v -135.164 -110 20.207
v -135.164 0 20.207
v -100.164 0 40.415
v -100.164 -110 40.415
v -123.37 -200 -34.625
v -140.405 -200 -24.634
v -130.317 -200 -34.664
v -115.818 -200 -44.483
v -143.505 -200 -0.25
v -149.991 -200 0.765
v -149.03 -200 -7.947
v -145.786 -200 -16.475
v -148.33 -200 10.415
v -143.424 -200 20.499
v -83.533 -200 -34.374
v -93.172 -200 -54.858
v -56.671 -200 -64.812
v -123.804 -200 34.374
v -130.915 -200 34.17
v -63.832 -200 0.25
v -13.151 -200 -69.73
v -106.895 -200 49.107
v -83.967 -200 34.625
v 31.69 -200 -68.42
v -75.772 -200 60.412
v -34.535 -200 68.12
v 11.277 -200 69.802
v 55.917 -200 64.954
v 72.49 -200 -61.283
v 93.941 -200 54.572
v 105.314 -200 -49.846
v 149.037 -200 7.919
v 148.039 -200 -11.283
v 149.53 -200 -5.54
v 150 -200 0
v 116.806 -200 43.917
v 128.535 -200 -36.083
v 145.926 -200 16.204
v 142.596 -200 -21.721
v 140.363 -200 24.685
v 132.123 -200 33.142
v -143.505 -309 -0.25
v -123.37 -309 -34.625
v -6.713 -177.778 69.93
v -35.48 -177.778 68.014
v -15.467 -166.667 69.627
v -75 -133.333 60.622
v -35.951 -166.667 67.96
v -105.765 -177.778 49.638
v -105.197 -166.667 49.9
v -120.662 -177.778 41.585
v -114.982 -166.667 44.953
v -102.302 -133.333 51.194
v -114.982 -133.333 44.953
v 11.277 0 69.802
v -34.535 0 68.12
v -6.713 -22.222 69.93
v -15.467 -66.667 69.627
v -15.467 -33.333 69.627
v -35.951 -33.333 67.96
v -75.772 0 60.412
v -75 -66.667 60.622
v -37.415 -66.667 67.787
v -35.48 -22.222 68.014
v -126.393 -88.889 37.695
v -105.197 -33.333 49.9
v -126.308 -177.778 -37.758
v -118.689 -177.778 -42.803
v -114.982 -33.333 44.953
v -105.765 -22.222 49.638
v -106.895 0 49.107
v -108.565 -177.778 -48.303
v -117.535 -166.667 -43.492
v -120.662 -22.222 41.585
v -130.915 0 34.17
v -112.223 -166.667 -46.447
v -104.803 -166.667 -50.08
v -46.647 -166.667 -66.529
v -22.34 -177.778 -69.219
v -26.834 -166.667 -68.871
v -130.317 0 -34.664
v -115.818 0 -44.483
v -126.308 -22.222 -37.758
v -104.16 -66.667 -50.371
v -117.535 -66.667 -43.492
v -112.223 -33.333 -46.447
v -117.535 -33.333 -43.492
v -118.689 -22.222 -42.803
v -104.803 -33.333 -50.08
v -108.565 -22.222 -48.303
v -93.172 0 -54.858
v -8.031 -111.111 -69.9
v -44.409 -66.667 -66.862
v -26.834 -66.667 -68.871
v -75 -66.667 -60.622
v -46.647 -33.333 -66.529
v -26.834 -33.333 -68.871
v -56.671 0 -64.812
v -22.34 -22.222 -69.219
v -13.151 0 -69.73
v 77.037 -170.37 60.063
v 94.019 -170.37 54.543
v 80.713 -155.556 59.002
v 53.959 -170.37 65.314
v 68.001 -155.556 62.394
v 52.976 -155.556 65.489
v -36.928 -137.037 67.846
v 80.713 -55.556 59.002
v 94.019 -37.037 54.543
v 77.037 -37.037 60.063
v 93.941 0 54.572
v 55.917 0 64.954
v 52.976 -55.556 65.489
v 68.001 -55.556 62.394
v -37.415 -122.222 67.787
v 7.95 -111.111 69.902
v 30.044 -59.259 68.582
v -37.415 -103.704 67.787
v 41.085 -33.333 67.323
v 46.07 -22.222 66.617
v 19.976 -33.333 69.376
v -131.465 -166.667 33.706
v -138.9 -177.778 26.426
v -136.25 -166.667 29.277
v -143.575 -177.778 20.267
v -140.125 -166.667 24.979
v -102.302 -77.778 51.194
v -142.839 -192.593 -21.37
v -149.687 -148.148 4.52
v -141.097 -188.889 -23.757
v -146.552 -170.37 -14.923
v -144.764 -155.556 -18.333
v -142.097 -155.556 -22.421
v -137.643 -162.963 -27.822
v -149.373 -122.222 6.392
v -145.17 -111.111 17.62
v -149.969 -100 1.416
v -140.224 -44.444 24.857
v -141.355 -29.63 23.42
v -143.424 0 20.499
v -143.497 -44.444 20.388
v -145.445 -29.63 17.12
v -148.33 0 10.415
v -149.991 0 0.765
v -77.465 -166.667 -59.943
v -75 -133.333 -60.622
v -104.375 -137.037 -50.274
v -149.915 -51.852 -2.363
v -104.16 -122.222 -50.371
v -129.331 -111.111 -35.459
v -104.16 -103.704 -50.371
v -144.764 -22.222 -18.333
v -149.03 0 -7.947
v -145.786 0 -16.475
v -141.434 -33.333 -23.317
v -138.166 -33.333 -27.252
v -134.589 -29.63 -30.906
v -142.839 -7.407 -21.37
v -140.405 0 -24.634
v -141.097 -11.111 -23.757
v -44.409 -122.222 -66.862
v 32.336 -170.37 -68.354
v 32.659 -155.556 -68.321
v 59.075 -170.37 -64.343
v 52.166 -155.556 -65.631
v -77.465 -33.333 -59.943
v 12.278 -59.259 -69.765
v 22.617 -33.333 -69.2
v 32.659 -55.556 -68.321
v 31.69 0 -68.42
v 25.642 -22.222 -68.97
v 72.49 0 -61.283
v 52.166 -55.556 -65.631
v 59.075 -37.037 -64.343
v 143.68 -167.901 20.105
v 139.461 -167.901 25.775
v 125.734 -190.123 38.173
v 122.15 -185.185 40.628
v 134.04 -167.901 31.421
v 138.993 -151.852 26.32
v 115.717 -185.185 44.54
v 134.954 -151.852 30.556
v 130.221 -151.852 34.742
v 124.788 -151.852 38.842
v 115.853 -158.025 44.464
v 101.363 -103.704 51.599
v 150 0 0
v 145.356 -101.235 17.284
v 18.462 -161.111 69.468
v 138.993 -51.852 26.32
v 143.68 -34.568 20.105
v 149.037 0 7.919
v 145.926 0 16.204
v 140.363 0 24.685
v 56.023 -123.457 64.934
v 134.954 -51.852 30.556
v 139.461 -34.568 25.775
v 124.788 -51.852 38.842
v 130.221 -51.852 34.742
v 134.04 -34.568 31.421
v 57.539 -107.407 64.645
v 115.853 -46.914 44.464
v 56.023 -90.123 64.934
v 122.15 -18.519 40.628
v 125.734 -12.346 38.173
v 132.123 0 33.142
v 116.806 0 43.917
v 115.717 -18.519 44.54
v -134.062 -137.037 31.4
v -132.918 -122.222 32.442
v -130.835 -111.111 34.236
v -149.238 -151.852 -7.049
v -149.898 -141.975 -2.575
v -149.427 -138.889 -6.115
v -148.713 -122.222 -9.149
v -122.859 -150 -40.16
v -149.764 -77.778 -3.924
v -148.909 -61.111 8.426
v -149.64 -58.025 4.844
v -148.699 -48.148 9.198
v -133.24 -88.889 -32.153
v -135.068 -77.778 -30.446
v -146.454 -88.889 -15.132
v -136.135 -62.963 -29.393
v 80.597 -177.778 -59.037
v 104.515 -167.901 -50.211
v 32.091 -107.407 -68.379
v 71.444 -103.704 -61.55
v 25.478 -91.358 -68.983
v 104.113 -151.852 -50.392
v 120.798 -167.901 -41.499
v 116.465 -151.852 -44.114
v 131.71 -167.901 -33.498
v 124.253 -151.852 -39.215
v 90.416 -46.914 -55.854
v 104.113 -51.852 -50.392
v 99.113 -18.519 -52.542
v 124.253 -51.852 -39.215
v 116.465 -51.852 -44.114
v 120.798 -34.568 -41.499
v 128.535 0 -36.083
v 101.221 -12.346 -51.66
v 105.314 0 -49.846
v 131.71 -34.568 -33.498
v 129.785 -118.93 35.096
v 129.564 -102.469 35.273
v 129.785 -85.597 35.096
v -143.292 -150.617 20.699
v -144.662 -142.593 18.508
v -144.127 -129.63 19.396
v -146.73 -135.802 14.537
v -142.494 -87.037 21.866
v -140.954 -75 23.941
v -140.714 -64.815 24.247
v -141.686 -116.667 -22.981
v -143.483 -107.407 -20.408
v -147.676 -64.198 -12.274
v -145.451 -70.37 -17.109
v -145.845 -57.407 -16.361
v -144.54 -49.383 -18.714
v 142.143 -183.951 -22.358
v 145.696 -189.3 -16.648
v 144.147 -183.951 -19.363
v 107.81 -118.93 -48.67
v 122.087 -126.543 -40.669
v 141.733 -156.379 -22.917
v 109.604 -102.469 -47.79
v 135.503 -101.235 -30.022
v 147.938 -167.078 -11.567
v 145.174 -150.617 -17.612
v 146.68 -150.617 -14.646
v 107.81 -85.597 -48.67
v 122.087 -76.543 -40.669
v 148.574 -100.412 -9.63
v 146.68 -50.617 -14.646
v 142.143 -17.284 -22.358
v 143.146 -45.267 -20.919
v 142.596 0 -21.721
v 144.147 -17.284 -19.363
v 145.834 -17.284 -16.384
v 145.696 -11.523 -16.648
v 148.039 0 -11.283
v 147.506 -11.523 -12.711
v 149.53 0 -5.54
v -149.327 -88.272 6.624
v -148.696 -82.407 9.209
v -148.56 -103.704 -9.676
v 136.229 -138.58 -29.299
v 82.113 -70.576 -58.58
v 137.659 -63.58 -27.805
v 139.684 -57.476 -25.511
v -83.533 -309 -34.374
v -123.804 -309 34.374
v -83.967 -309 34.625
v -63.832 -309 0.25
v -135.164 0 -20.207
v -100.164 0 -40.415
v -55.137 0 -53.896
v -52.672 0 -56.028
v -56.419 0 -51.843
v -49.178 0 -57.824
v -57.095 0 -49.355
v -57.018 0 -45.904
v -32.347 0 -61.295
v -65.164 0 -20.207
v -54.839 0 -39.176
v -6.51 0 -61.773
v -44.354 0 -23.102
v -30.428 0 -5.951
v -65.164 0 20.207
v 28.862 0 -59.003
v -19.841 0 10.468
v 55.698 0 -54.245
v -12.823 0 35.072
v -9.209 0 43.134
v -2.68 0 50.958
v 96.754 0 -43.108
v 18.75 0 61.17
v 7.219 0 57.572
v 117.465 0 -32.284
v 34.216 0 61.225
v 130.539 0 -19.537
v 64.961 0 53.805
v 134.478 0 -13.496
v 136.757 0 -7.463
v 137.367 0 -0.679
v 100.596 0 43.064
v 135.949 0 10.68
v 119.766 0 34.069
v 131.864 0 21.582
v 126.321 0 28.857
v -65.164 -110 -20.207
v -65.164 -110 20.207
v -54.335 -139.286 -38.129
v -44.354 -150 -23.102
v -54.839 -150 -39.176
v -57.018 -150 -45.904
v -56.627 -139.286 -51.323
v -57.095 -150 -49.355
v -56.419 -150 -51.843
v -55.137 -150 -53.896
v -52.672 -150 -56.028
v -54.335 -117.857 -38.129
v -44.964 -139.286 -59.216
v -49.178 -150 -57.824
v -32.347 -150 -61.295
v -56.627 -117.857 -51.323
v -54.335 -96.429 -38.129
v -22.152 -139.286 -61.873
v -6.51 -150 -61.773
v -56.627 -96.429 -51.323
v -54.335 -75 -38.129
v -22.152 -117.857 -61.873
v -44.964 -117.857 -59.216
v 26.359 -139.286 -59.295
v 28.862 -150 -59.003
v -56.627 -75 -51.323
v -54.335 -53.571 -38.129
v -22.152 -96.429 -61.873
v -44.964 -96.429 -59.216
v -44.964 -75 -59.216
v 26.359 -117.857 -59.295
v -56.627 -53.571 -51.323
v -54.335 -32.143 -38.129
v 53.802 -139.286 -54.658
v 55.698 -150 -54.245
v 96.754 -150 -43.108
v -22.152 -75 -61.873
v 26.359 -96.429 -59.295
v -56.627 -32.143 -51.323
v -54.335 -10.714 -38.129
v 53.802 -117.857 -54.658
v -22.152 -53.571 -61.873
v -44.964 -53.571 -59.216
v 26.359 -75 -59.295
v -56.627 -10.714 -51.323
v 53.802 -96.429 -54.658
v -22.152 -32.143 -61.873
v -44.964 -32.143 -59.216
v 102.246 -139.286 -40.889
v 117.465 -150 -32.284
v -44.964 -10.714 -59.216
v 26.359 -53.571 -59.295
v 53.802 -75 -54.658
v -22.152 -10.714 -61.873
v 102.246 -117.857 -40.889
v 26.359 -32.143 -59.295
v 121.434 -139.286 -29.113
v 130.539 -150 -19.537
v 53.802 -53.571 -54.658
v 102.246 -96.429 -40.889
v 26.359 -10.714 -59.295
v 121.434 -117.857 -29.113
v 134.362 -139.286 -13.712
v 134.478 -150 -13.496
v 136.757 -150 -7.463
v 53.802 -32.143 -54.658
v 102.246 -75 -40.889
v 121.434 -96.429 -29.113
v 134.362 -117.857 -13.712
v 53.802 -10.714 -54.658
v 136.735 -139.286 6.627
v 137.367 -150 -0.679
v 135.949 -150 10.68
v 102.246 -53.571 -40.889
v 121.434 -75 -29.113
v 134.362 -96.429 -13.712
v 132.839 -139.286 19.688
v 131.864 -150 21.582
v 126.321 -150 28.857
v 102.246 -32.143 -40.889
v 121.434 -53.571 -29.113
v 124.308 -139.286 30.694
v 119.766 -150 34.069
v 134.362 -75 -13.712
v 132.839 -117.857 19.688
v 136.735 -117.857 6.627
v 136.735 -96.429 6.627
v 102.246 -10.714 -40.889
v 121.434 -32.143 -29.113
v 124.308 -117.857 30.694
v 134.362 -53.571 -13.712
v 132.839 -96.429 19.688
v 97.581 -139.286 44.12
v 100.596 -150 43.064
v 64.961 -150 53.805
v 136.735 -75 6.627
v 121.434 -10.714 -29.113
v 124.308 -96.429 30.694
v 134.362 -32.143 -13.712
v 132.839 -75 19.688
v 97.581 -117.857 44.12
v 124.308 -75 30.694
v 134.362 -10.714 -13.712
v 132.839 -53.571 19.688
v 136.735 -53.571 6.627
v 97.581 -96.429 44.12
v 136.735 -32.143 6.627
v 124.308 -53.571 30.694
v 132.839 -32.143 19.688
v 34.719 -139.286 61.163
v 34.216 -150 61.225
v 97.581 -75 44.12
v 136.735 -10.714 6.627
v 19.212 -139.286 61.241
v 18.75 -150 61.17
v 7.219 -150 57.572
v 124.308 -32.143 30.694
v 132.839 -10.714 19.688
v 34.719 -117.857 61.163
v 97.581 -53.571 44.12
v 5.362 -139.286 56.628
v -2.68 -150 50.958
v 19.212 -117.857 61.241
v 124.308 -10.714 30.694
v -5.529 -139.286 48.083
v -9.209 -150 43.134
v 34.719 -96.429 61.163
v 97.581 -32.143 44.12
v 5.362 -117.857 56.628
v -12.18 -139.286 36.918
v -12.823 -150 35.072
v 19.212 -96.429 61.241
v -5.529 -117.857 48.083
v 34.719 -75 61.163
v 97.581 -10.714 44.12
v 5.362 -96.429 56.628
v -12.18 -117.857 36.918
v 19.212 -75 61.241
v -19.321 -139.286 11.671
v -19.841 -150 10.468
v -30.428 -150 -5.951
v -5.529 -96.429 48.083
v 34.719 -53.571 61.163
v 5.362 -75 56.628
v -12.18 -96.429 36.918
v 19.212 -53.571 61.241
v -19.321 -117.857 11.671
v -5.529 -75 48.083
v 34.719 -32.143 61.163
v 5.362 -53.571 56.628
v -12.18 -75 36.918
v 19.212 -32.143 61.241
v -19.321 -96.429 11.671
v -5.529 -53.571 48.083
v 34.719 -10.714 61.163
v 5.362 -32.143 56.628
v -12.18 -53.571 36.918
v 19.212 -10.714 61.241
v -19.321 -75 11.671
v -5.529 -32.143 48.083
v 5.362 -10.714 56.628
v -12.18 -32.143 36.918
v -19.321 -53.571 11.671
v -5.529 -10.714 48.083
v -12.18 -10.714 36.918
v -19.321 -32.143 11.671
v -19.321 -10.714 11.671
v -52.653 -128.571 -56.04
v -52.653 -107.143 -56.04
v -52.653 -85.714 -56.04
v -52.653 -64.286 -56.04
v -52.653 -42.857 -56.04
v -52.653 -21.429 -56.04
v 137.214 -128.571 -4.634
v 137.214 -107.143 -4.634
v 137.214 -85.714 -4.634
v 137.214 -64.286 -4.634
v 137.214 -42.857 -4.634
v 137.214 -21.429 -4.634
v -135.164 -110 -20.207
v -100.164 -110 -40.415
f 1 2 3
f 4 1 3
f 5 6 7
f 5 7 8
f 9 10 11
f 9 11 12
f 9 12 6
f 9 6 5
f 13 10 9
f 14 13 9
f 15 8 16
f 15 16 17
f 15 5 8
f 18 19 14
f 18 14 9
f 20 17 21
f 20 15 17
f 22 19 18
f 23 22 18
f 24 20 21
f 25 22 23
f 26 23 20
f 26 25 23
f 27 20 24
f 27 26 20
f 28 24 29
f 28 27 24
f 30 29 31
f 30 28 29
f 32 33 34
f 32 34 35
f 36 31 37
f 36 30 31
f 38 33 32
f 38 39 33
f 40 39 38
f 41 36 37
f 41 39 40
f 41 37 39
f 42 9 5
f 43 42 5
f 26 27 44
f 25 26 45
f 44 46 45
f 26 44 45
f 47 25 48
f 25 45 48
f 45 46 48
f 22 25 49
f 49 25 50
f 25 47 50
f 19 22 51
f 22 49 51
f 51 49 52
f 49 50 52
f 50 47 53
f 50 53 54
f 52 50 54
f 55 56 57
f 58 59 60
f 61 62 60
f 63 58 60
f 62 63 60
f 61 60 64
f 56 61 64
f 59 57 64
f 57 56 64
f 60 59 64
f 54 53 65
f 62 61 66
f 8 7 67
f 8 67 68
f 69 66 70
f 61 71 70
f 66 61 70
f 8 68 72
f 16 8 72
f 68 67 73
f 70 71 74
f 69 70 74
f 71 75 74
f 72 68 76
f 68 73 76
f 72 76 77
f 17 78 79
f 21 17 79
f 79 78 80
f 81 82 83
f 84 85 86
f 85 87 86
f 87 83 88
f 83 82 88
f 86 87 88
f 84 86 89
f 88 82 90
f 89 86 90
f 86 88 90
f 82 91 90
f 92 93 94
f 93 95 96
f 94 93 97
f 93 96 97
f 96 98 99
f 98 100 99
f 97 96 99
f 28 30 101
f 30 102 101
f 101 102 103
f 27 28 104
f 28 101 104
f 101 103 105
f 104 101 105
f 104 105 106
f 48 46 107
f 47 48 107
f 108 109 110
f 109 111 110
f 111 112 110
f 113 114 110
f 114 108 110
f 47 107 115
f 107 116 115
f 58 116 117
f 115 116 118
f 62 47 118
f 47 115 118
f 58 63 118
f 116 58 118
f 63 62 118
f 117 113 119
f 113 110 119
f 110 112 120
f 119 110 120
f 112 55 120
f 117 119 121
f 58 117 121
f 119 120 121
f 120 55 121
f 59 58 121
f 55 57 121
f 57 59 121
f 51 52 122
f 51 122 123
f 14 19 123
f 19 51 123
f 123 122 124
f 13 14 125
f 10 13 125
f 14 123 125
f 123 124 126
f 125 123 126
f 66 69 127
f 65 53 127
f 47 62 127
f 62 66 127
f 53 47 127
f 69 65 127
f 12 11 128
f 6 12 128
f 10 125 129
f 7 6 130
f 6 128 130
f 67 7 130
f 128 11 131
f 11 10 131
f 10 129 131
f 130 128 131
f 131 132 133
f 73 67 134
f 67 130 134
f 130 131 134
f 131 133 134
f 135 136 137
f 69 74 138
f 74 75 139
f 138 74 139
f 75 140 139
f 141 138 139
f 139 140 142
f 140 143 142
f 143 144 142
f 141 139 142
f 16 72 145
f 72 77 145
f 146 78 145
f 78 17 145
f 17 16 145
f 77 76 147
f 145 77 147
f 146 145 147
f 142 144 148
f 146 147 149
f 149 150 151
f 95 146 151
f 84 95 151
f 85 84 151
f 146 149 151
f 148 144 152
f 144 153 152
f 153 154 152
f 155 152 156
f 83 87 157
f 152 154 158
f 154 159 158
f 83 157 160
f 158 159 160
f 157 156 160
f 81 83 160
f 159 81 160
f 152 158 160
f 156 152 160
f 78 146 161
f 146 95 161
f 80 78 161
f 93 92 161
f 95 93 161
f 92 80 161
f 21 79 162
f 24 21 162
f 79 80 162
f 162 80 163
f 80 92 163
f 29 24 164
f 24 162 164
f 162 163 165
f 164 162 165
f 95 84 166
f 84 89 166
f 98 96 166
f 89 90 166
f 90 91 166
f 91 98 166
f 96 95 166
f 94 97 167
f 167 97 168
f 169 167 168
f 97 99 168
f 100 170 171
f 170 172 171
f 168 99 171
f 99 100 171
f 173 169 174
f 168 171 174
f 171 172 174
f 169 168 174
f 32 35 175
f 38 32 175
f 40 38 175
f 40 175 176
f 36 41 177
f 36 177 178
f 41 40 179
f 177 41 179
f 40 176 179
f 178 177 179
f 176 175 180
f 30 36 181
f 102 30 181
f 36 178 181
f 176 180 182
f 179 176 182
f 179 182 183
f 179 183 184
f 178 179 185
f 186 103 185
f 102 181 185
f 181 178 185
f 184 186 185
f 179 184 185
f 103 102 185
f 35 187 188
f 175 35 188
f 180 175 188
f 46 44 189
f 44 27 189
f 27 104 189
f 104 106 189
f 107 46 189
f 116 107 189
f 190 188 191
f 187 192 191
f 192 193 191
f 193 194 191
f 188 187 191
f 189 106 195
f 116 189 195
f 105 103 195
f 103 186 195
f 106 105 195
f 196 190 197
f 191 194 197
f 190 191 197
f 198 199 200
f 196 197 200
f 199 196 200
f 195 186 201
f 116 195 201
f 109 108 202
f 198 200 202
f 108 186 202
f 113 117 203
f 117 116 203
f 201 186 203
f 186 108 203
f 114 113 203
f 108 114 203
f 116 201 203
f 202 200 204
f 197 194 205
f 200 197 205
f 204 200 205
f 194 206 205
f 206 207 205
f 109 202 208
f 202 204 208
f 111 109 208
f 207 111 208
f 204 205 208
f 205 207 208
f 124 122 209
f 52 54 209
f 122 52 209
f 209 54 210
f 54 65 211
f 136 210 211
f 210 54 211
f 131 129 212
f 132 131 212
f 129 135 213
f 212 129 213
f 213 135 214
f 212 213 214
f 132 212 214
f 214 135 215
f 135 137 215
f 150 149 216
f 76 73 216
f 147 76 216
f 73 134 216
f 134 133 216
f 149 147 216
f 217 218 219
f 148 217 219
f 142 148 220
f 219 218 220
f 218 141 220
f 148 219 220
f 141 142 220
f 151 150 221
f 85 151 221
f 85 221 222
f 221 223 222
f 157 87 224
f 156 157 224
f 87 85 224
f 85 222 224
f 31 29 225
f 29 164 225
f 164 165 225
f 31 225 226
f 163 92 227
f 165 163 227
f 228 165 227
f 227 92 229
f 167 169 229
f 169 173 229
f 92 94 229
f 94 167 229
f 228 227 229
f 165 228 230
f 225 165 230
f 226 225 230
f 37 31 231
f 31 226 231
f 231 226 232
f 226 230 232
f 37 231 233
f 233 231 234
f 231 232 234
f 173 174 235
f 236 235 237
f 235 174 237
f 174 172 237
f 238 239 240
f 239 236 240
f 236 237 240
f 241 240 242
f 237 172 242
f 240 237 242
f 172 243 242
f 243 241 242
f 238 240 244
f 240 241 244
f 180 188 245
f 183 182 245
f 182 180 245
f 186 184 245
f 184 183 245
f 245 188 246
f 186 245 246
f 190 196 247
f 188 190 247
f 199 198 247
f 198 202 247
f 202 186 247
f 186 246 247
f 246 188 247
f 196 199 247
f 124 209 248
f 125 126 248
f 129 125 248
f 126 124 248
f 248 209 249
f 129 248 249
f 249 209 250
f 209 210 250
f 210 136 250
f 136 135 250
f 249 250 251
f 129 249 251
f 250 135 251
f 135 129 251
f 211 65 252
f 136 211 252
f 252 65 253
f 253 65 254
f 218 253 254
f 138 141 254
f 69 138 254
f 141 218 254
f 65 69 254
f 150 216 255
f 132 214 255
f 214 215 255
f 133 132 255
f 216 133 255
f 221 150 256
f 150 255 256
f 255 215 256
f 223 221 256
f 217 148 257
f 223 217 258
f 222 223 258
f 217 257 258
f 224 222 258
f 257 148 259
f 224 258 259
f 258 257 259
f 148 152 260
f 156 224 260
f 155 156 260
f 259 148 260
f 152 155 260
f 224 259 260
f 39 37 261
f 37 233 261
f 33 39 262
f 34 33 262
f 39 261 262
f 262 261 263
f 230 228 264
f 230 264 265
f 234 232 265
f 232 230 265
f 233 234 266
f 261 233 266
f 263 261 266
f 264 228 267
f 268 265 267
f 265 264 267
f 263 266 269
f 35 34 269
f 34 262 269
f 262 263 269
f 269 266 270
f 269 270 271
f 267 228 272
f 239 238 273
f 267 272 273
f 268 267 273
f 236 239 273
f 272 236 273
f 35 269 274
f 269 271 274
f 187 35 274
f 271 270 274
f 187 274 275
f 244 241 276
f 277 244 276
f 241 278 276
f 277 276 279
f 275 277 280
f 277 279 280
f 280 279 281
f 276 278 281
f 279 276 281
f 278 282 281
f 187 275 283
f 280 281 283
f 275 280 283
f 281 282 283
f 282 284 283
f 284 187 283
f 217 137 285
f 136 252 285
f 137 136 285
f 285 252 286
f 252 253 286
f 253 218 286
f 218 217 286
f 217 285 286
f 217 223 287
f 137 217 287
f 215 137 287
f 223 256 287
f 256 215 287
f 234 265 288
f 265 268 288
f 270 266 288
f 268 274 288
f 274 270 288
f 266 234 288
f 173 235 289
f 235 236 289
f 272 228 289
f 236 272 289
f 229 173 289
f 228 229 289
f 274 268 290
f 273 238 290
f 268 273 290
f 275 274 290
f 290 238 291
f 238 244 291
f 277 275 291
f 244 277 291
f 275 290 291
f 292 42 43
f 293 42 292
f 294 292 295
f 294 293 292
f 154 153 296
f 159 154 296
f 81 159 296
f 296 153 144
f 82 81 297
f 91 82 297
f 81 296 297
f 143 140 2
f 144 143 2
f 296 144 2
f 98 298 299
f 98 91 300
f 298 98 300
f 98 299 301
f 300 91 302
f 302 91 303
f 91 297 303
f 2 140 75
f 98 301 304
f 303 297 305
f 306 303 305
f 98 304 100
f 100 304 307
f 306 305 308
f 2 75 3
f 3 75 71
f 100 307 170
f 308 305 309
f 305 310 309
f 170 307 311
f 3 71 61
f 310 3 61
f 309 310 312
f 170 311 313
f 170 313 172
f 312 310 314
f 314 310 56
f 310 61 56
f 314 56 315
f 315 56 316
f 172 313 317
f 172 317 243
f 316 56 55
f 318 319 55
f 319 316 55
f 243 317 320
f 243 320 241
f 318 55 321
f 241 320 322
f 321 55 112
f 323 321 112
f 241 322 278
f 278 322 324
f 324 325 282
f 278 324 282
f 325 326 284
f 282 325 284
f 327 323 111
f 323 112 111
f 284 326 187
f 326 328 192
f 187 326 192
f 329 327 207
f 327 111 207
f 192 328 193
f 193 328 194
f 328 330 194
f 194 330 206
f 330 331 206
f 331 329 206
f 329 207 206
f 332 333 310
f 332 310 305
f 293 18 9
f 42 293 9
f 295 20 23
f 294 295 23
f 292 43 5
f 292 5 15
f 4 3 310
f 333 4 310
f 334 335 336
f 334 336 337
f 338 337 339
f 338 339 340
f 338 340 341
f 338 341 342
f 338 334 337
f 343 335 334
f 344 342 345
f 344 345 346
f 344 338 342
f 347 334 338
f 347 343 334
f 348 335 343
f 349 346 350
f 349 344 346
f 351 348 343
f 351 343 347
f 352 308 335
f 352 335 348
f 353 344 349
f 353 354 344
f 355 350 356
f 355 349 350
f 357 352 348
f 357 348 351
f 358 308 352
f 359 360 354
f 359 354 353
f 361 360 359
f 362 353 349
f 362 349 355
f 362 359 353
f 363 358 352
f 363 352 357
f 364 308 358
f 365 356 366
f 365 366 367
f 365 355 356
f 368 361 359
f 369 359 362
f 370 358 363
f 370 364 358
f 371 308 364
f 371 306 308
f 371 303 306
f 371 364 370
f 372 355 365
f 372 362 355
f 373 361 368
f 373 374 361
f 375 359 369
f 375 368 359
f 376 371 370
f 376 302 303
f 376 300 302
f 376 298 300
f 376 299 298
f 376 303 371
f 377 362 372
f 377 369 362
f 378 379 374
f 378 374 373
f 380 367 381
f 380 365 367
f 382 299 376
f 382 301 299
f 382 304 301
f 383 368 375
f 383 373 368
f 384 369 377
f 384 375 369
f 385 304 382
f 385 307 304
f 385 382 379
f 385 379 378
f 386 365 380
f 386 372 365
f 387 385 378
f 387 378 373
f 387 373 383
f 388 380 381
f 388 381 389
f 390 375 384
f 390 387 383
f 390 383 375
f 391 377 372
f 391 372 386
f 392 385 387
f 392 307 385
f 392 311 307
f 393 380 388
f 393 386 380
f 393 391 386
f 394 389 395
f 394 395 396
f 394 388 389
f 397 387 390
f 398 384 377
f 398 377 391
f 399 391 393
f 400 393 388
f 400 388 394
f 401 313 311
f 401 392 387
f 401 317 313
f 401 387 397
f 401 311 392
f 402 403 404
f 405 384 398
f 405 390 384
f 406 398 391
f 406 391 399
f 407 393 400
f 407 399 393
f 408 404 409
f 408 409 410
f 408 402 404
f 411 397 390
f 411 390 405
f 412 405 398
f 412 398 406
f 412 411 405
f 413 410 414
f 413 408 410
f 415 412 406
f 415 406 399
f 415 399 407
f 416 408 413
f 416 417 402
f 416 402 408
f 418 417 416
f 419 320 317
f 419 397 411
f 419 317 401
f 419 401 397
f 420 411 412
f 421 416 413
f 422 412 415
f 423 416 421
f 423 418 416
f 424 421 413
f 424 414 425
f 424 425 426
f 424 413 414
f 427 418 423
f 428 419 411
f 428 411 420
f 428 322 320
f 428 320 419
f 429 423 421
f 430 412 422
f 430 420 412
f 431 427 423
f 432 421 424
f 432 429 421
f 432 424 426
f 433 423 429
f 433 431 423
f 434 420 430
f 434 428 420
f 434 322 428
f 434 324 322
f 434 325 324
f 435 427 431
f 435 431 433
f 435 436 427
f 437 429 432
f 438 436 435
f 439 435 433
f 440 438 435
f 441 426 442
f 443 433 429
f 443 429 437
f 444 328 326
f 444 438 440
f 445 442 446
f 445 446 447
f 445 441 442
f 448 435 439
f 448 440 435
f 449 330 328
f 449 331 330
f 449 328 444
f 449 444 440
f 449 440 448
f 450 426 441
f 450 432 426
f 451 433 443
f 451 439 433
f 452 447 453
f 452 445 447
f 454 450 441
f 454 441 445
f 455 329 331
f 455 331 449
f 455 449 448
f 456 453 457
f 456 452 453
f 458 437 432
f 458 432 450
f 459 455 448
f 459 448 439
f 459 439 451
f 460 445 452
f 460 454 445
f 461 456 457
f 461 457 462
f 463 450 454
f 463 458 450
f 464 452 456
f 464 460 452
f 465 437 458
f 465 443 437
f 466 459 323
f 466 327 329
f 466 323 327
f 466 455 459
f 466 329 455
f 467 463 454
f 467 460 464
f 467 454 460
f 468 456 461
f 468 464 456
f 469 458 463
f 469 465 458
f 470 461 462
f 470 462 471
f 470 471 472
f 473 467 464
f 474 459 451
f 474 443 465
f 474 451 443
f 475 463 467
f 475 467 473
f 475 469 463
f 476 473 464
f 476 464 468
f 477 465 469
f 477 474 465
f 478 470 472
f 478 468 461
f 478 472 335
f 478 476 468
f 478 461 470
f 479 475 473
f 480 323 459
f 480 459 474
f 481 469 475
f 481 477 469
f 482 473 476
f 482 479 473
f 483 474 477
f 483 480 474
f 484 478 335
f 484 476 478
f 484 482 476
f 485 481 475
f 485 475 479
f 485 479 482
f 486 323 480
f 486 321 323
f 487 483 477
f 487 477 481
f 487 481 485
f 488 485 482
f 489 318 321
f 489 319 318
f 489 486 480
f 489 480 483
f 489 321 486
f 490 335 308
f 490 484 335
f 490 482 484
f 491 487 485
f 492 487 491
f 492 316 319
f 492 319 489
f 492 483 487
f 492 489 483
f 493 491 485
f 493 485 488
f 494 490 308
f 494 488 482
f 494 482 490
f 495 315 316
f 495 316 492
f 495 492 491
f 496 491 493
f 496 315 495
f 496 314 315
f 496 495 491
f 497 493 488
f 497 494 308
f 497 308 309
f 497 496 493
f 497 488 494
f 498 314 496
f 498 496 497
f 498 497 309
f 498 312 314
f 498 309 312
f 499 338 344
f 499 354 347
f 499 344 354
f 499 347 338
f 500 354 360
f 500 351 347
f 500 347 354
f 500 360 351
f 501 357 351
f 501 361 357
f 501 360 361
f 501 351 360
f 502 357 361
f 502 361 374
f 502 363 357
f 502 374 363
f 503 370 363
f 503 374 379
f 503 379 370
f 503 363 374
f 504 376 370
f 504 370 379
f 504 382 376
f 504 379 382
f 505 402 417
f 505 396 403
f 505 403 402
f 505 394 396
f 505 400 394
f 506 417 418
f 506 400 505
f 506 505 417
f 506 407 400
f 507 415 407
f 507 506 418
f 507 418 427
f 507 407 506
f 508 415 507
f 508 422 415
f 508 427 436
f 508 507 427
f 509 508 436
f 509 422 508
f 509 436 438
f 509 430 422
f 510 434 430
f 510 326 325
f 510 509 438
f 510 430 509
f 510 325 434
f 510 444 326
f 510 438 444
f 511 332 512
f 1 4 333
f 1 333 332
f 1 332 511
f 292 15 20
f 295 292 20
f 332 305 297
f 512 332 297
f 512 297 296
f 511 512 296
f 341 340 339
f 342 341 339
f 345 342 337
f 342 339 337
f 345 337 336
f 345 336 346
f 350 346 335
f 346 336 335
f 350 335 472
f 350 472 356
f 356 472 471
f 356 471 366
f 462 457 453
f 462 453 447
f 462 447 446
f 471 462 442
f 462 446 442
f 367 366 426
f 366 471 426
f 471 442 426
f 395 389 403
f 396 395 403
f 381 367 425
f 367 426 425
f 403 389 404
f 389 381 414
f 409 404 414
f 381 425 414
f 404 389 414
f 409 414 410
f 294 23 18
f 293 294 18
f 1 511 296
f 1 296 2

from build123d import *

# Parameters (mm, degrees)
F1_DEPTH = 200
F3_DEPTH = 109
F5_DEPTH = 110
F7_DEPTH = 150


with BuildPart() as f1:
    # F0 (on Front) → F1 (new body)
    with BuildSketch(Plane.XZ):
        with BuildLine():
            add(Edge.make_bspline(
                [(150, 0), (150, 121.2435565298), (-75, 60.6217782649), (-300, 0), (-75, -60.6217782649), (150, -121.2435565298), (150, 0)],
                knots=[0, 0, 0, 2.0943951024, 2.0943951024, 4.1887902048, 4.1887902048, 6.2831853072, 6.2831853072, 6.2831853072], degree=2, weights=[1, 0.5, 1, 0.5, 1, 0.5, 1]))
        make_face()
    extrude(amount=F1_DEPTH)

    # F2 (on face) → F3 (join)
    with BuildSketch(Plane.XZ.offset(200)):
        Polygon((-83.5333608229, -34.3740822573), (-63.83208505, 0.2504716448), (-83.9671904375, 34.6245539021), (-123.8035715978, 34.3740822573), (-143.5048473707, -0.2504716448), (-123.3697419833, -34.6245539021), align=None)
    extrude(amount=F3_DEPTH)

    # F4 (on face) → F5 (cut)
    with BuildSketch(Plane(origin=(0, 0, 0), x_dir=(-1, 0, 0), z_dir=(0, 1, 0))):
        Polygon((135.164309144, -20.2072594216), (135.164309144, 20.2072594216), (100.164309144, 40.4145188433), (65.164309144, 20.2072594216), (65.164309144, -20.2072594216), (100.164309144, -40.4145188433), align=None)
    extrude(amount=-F5_DEPTH, mode=Mode.SUBTRACT)

    # F6 (on face) → F7 (cut)
    with BuildSketch(Plane(origin=(0, 0, 0), x_dir=(-1, 0, 0), z_dir=(0, 1, 0))):
        with BuildLine():
            add(Edge.make_bspline(
                [(44.3536266685, -23.1022424996), (52.9544348197, -34.1563620058), (73.7692574569, -66.4484611773), (-25.6073405061, -60.5511833627), (-51.4366682447, -55.265214578), (-90.9208210143, -46.4146624004), (-118.523618488, -34.0551080466), (-135.7646837897, -14.3576106227), (-138.5377993297, -0.0881254192), (-133.1232883358, 28.3352558589), (-102.6690695003, 43.6855284564), (-66.8786438898, 52.700358023), (-19.4064630693, 68.2630542358), (14.8305548312, 44.5367496987), (15.2770077241, 8.9124603237), (34.5080847872, -10.4483389774), (44.3536266685, -23.1022424996)],
                knots=[0, 0, 0, 0, 0.0692904216, 0.1750397077, 0.2449941504, 0.3192777608, 0.387061419, 0.4464856226, 0.491880771, 0.5534564026, 0.621549575, 0.6968998019, 0.7807832914, 0.8521747648, 0.920681669, 1, 1, 1, 1], degree=3))
        make_face()
    extrude(amount=-F7_DEPTH, mode=Mode.SUBTRACT)


solid = f1.part
